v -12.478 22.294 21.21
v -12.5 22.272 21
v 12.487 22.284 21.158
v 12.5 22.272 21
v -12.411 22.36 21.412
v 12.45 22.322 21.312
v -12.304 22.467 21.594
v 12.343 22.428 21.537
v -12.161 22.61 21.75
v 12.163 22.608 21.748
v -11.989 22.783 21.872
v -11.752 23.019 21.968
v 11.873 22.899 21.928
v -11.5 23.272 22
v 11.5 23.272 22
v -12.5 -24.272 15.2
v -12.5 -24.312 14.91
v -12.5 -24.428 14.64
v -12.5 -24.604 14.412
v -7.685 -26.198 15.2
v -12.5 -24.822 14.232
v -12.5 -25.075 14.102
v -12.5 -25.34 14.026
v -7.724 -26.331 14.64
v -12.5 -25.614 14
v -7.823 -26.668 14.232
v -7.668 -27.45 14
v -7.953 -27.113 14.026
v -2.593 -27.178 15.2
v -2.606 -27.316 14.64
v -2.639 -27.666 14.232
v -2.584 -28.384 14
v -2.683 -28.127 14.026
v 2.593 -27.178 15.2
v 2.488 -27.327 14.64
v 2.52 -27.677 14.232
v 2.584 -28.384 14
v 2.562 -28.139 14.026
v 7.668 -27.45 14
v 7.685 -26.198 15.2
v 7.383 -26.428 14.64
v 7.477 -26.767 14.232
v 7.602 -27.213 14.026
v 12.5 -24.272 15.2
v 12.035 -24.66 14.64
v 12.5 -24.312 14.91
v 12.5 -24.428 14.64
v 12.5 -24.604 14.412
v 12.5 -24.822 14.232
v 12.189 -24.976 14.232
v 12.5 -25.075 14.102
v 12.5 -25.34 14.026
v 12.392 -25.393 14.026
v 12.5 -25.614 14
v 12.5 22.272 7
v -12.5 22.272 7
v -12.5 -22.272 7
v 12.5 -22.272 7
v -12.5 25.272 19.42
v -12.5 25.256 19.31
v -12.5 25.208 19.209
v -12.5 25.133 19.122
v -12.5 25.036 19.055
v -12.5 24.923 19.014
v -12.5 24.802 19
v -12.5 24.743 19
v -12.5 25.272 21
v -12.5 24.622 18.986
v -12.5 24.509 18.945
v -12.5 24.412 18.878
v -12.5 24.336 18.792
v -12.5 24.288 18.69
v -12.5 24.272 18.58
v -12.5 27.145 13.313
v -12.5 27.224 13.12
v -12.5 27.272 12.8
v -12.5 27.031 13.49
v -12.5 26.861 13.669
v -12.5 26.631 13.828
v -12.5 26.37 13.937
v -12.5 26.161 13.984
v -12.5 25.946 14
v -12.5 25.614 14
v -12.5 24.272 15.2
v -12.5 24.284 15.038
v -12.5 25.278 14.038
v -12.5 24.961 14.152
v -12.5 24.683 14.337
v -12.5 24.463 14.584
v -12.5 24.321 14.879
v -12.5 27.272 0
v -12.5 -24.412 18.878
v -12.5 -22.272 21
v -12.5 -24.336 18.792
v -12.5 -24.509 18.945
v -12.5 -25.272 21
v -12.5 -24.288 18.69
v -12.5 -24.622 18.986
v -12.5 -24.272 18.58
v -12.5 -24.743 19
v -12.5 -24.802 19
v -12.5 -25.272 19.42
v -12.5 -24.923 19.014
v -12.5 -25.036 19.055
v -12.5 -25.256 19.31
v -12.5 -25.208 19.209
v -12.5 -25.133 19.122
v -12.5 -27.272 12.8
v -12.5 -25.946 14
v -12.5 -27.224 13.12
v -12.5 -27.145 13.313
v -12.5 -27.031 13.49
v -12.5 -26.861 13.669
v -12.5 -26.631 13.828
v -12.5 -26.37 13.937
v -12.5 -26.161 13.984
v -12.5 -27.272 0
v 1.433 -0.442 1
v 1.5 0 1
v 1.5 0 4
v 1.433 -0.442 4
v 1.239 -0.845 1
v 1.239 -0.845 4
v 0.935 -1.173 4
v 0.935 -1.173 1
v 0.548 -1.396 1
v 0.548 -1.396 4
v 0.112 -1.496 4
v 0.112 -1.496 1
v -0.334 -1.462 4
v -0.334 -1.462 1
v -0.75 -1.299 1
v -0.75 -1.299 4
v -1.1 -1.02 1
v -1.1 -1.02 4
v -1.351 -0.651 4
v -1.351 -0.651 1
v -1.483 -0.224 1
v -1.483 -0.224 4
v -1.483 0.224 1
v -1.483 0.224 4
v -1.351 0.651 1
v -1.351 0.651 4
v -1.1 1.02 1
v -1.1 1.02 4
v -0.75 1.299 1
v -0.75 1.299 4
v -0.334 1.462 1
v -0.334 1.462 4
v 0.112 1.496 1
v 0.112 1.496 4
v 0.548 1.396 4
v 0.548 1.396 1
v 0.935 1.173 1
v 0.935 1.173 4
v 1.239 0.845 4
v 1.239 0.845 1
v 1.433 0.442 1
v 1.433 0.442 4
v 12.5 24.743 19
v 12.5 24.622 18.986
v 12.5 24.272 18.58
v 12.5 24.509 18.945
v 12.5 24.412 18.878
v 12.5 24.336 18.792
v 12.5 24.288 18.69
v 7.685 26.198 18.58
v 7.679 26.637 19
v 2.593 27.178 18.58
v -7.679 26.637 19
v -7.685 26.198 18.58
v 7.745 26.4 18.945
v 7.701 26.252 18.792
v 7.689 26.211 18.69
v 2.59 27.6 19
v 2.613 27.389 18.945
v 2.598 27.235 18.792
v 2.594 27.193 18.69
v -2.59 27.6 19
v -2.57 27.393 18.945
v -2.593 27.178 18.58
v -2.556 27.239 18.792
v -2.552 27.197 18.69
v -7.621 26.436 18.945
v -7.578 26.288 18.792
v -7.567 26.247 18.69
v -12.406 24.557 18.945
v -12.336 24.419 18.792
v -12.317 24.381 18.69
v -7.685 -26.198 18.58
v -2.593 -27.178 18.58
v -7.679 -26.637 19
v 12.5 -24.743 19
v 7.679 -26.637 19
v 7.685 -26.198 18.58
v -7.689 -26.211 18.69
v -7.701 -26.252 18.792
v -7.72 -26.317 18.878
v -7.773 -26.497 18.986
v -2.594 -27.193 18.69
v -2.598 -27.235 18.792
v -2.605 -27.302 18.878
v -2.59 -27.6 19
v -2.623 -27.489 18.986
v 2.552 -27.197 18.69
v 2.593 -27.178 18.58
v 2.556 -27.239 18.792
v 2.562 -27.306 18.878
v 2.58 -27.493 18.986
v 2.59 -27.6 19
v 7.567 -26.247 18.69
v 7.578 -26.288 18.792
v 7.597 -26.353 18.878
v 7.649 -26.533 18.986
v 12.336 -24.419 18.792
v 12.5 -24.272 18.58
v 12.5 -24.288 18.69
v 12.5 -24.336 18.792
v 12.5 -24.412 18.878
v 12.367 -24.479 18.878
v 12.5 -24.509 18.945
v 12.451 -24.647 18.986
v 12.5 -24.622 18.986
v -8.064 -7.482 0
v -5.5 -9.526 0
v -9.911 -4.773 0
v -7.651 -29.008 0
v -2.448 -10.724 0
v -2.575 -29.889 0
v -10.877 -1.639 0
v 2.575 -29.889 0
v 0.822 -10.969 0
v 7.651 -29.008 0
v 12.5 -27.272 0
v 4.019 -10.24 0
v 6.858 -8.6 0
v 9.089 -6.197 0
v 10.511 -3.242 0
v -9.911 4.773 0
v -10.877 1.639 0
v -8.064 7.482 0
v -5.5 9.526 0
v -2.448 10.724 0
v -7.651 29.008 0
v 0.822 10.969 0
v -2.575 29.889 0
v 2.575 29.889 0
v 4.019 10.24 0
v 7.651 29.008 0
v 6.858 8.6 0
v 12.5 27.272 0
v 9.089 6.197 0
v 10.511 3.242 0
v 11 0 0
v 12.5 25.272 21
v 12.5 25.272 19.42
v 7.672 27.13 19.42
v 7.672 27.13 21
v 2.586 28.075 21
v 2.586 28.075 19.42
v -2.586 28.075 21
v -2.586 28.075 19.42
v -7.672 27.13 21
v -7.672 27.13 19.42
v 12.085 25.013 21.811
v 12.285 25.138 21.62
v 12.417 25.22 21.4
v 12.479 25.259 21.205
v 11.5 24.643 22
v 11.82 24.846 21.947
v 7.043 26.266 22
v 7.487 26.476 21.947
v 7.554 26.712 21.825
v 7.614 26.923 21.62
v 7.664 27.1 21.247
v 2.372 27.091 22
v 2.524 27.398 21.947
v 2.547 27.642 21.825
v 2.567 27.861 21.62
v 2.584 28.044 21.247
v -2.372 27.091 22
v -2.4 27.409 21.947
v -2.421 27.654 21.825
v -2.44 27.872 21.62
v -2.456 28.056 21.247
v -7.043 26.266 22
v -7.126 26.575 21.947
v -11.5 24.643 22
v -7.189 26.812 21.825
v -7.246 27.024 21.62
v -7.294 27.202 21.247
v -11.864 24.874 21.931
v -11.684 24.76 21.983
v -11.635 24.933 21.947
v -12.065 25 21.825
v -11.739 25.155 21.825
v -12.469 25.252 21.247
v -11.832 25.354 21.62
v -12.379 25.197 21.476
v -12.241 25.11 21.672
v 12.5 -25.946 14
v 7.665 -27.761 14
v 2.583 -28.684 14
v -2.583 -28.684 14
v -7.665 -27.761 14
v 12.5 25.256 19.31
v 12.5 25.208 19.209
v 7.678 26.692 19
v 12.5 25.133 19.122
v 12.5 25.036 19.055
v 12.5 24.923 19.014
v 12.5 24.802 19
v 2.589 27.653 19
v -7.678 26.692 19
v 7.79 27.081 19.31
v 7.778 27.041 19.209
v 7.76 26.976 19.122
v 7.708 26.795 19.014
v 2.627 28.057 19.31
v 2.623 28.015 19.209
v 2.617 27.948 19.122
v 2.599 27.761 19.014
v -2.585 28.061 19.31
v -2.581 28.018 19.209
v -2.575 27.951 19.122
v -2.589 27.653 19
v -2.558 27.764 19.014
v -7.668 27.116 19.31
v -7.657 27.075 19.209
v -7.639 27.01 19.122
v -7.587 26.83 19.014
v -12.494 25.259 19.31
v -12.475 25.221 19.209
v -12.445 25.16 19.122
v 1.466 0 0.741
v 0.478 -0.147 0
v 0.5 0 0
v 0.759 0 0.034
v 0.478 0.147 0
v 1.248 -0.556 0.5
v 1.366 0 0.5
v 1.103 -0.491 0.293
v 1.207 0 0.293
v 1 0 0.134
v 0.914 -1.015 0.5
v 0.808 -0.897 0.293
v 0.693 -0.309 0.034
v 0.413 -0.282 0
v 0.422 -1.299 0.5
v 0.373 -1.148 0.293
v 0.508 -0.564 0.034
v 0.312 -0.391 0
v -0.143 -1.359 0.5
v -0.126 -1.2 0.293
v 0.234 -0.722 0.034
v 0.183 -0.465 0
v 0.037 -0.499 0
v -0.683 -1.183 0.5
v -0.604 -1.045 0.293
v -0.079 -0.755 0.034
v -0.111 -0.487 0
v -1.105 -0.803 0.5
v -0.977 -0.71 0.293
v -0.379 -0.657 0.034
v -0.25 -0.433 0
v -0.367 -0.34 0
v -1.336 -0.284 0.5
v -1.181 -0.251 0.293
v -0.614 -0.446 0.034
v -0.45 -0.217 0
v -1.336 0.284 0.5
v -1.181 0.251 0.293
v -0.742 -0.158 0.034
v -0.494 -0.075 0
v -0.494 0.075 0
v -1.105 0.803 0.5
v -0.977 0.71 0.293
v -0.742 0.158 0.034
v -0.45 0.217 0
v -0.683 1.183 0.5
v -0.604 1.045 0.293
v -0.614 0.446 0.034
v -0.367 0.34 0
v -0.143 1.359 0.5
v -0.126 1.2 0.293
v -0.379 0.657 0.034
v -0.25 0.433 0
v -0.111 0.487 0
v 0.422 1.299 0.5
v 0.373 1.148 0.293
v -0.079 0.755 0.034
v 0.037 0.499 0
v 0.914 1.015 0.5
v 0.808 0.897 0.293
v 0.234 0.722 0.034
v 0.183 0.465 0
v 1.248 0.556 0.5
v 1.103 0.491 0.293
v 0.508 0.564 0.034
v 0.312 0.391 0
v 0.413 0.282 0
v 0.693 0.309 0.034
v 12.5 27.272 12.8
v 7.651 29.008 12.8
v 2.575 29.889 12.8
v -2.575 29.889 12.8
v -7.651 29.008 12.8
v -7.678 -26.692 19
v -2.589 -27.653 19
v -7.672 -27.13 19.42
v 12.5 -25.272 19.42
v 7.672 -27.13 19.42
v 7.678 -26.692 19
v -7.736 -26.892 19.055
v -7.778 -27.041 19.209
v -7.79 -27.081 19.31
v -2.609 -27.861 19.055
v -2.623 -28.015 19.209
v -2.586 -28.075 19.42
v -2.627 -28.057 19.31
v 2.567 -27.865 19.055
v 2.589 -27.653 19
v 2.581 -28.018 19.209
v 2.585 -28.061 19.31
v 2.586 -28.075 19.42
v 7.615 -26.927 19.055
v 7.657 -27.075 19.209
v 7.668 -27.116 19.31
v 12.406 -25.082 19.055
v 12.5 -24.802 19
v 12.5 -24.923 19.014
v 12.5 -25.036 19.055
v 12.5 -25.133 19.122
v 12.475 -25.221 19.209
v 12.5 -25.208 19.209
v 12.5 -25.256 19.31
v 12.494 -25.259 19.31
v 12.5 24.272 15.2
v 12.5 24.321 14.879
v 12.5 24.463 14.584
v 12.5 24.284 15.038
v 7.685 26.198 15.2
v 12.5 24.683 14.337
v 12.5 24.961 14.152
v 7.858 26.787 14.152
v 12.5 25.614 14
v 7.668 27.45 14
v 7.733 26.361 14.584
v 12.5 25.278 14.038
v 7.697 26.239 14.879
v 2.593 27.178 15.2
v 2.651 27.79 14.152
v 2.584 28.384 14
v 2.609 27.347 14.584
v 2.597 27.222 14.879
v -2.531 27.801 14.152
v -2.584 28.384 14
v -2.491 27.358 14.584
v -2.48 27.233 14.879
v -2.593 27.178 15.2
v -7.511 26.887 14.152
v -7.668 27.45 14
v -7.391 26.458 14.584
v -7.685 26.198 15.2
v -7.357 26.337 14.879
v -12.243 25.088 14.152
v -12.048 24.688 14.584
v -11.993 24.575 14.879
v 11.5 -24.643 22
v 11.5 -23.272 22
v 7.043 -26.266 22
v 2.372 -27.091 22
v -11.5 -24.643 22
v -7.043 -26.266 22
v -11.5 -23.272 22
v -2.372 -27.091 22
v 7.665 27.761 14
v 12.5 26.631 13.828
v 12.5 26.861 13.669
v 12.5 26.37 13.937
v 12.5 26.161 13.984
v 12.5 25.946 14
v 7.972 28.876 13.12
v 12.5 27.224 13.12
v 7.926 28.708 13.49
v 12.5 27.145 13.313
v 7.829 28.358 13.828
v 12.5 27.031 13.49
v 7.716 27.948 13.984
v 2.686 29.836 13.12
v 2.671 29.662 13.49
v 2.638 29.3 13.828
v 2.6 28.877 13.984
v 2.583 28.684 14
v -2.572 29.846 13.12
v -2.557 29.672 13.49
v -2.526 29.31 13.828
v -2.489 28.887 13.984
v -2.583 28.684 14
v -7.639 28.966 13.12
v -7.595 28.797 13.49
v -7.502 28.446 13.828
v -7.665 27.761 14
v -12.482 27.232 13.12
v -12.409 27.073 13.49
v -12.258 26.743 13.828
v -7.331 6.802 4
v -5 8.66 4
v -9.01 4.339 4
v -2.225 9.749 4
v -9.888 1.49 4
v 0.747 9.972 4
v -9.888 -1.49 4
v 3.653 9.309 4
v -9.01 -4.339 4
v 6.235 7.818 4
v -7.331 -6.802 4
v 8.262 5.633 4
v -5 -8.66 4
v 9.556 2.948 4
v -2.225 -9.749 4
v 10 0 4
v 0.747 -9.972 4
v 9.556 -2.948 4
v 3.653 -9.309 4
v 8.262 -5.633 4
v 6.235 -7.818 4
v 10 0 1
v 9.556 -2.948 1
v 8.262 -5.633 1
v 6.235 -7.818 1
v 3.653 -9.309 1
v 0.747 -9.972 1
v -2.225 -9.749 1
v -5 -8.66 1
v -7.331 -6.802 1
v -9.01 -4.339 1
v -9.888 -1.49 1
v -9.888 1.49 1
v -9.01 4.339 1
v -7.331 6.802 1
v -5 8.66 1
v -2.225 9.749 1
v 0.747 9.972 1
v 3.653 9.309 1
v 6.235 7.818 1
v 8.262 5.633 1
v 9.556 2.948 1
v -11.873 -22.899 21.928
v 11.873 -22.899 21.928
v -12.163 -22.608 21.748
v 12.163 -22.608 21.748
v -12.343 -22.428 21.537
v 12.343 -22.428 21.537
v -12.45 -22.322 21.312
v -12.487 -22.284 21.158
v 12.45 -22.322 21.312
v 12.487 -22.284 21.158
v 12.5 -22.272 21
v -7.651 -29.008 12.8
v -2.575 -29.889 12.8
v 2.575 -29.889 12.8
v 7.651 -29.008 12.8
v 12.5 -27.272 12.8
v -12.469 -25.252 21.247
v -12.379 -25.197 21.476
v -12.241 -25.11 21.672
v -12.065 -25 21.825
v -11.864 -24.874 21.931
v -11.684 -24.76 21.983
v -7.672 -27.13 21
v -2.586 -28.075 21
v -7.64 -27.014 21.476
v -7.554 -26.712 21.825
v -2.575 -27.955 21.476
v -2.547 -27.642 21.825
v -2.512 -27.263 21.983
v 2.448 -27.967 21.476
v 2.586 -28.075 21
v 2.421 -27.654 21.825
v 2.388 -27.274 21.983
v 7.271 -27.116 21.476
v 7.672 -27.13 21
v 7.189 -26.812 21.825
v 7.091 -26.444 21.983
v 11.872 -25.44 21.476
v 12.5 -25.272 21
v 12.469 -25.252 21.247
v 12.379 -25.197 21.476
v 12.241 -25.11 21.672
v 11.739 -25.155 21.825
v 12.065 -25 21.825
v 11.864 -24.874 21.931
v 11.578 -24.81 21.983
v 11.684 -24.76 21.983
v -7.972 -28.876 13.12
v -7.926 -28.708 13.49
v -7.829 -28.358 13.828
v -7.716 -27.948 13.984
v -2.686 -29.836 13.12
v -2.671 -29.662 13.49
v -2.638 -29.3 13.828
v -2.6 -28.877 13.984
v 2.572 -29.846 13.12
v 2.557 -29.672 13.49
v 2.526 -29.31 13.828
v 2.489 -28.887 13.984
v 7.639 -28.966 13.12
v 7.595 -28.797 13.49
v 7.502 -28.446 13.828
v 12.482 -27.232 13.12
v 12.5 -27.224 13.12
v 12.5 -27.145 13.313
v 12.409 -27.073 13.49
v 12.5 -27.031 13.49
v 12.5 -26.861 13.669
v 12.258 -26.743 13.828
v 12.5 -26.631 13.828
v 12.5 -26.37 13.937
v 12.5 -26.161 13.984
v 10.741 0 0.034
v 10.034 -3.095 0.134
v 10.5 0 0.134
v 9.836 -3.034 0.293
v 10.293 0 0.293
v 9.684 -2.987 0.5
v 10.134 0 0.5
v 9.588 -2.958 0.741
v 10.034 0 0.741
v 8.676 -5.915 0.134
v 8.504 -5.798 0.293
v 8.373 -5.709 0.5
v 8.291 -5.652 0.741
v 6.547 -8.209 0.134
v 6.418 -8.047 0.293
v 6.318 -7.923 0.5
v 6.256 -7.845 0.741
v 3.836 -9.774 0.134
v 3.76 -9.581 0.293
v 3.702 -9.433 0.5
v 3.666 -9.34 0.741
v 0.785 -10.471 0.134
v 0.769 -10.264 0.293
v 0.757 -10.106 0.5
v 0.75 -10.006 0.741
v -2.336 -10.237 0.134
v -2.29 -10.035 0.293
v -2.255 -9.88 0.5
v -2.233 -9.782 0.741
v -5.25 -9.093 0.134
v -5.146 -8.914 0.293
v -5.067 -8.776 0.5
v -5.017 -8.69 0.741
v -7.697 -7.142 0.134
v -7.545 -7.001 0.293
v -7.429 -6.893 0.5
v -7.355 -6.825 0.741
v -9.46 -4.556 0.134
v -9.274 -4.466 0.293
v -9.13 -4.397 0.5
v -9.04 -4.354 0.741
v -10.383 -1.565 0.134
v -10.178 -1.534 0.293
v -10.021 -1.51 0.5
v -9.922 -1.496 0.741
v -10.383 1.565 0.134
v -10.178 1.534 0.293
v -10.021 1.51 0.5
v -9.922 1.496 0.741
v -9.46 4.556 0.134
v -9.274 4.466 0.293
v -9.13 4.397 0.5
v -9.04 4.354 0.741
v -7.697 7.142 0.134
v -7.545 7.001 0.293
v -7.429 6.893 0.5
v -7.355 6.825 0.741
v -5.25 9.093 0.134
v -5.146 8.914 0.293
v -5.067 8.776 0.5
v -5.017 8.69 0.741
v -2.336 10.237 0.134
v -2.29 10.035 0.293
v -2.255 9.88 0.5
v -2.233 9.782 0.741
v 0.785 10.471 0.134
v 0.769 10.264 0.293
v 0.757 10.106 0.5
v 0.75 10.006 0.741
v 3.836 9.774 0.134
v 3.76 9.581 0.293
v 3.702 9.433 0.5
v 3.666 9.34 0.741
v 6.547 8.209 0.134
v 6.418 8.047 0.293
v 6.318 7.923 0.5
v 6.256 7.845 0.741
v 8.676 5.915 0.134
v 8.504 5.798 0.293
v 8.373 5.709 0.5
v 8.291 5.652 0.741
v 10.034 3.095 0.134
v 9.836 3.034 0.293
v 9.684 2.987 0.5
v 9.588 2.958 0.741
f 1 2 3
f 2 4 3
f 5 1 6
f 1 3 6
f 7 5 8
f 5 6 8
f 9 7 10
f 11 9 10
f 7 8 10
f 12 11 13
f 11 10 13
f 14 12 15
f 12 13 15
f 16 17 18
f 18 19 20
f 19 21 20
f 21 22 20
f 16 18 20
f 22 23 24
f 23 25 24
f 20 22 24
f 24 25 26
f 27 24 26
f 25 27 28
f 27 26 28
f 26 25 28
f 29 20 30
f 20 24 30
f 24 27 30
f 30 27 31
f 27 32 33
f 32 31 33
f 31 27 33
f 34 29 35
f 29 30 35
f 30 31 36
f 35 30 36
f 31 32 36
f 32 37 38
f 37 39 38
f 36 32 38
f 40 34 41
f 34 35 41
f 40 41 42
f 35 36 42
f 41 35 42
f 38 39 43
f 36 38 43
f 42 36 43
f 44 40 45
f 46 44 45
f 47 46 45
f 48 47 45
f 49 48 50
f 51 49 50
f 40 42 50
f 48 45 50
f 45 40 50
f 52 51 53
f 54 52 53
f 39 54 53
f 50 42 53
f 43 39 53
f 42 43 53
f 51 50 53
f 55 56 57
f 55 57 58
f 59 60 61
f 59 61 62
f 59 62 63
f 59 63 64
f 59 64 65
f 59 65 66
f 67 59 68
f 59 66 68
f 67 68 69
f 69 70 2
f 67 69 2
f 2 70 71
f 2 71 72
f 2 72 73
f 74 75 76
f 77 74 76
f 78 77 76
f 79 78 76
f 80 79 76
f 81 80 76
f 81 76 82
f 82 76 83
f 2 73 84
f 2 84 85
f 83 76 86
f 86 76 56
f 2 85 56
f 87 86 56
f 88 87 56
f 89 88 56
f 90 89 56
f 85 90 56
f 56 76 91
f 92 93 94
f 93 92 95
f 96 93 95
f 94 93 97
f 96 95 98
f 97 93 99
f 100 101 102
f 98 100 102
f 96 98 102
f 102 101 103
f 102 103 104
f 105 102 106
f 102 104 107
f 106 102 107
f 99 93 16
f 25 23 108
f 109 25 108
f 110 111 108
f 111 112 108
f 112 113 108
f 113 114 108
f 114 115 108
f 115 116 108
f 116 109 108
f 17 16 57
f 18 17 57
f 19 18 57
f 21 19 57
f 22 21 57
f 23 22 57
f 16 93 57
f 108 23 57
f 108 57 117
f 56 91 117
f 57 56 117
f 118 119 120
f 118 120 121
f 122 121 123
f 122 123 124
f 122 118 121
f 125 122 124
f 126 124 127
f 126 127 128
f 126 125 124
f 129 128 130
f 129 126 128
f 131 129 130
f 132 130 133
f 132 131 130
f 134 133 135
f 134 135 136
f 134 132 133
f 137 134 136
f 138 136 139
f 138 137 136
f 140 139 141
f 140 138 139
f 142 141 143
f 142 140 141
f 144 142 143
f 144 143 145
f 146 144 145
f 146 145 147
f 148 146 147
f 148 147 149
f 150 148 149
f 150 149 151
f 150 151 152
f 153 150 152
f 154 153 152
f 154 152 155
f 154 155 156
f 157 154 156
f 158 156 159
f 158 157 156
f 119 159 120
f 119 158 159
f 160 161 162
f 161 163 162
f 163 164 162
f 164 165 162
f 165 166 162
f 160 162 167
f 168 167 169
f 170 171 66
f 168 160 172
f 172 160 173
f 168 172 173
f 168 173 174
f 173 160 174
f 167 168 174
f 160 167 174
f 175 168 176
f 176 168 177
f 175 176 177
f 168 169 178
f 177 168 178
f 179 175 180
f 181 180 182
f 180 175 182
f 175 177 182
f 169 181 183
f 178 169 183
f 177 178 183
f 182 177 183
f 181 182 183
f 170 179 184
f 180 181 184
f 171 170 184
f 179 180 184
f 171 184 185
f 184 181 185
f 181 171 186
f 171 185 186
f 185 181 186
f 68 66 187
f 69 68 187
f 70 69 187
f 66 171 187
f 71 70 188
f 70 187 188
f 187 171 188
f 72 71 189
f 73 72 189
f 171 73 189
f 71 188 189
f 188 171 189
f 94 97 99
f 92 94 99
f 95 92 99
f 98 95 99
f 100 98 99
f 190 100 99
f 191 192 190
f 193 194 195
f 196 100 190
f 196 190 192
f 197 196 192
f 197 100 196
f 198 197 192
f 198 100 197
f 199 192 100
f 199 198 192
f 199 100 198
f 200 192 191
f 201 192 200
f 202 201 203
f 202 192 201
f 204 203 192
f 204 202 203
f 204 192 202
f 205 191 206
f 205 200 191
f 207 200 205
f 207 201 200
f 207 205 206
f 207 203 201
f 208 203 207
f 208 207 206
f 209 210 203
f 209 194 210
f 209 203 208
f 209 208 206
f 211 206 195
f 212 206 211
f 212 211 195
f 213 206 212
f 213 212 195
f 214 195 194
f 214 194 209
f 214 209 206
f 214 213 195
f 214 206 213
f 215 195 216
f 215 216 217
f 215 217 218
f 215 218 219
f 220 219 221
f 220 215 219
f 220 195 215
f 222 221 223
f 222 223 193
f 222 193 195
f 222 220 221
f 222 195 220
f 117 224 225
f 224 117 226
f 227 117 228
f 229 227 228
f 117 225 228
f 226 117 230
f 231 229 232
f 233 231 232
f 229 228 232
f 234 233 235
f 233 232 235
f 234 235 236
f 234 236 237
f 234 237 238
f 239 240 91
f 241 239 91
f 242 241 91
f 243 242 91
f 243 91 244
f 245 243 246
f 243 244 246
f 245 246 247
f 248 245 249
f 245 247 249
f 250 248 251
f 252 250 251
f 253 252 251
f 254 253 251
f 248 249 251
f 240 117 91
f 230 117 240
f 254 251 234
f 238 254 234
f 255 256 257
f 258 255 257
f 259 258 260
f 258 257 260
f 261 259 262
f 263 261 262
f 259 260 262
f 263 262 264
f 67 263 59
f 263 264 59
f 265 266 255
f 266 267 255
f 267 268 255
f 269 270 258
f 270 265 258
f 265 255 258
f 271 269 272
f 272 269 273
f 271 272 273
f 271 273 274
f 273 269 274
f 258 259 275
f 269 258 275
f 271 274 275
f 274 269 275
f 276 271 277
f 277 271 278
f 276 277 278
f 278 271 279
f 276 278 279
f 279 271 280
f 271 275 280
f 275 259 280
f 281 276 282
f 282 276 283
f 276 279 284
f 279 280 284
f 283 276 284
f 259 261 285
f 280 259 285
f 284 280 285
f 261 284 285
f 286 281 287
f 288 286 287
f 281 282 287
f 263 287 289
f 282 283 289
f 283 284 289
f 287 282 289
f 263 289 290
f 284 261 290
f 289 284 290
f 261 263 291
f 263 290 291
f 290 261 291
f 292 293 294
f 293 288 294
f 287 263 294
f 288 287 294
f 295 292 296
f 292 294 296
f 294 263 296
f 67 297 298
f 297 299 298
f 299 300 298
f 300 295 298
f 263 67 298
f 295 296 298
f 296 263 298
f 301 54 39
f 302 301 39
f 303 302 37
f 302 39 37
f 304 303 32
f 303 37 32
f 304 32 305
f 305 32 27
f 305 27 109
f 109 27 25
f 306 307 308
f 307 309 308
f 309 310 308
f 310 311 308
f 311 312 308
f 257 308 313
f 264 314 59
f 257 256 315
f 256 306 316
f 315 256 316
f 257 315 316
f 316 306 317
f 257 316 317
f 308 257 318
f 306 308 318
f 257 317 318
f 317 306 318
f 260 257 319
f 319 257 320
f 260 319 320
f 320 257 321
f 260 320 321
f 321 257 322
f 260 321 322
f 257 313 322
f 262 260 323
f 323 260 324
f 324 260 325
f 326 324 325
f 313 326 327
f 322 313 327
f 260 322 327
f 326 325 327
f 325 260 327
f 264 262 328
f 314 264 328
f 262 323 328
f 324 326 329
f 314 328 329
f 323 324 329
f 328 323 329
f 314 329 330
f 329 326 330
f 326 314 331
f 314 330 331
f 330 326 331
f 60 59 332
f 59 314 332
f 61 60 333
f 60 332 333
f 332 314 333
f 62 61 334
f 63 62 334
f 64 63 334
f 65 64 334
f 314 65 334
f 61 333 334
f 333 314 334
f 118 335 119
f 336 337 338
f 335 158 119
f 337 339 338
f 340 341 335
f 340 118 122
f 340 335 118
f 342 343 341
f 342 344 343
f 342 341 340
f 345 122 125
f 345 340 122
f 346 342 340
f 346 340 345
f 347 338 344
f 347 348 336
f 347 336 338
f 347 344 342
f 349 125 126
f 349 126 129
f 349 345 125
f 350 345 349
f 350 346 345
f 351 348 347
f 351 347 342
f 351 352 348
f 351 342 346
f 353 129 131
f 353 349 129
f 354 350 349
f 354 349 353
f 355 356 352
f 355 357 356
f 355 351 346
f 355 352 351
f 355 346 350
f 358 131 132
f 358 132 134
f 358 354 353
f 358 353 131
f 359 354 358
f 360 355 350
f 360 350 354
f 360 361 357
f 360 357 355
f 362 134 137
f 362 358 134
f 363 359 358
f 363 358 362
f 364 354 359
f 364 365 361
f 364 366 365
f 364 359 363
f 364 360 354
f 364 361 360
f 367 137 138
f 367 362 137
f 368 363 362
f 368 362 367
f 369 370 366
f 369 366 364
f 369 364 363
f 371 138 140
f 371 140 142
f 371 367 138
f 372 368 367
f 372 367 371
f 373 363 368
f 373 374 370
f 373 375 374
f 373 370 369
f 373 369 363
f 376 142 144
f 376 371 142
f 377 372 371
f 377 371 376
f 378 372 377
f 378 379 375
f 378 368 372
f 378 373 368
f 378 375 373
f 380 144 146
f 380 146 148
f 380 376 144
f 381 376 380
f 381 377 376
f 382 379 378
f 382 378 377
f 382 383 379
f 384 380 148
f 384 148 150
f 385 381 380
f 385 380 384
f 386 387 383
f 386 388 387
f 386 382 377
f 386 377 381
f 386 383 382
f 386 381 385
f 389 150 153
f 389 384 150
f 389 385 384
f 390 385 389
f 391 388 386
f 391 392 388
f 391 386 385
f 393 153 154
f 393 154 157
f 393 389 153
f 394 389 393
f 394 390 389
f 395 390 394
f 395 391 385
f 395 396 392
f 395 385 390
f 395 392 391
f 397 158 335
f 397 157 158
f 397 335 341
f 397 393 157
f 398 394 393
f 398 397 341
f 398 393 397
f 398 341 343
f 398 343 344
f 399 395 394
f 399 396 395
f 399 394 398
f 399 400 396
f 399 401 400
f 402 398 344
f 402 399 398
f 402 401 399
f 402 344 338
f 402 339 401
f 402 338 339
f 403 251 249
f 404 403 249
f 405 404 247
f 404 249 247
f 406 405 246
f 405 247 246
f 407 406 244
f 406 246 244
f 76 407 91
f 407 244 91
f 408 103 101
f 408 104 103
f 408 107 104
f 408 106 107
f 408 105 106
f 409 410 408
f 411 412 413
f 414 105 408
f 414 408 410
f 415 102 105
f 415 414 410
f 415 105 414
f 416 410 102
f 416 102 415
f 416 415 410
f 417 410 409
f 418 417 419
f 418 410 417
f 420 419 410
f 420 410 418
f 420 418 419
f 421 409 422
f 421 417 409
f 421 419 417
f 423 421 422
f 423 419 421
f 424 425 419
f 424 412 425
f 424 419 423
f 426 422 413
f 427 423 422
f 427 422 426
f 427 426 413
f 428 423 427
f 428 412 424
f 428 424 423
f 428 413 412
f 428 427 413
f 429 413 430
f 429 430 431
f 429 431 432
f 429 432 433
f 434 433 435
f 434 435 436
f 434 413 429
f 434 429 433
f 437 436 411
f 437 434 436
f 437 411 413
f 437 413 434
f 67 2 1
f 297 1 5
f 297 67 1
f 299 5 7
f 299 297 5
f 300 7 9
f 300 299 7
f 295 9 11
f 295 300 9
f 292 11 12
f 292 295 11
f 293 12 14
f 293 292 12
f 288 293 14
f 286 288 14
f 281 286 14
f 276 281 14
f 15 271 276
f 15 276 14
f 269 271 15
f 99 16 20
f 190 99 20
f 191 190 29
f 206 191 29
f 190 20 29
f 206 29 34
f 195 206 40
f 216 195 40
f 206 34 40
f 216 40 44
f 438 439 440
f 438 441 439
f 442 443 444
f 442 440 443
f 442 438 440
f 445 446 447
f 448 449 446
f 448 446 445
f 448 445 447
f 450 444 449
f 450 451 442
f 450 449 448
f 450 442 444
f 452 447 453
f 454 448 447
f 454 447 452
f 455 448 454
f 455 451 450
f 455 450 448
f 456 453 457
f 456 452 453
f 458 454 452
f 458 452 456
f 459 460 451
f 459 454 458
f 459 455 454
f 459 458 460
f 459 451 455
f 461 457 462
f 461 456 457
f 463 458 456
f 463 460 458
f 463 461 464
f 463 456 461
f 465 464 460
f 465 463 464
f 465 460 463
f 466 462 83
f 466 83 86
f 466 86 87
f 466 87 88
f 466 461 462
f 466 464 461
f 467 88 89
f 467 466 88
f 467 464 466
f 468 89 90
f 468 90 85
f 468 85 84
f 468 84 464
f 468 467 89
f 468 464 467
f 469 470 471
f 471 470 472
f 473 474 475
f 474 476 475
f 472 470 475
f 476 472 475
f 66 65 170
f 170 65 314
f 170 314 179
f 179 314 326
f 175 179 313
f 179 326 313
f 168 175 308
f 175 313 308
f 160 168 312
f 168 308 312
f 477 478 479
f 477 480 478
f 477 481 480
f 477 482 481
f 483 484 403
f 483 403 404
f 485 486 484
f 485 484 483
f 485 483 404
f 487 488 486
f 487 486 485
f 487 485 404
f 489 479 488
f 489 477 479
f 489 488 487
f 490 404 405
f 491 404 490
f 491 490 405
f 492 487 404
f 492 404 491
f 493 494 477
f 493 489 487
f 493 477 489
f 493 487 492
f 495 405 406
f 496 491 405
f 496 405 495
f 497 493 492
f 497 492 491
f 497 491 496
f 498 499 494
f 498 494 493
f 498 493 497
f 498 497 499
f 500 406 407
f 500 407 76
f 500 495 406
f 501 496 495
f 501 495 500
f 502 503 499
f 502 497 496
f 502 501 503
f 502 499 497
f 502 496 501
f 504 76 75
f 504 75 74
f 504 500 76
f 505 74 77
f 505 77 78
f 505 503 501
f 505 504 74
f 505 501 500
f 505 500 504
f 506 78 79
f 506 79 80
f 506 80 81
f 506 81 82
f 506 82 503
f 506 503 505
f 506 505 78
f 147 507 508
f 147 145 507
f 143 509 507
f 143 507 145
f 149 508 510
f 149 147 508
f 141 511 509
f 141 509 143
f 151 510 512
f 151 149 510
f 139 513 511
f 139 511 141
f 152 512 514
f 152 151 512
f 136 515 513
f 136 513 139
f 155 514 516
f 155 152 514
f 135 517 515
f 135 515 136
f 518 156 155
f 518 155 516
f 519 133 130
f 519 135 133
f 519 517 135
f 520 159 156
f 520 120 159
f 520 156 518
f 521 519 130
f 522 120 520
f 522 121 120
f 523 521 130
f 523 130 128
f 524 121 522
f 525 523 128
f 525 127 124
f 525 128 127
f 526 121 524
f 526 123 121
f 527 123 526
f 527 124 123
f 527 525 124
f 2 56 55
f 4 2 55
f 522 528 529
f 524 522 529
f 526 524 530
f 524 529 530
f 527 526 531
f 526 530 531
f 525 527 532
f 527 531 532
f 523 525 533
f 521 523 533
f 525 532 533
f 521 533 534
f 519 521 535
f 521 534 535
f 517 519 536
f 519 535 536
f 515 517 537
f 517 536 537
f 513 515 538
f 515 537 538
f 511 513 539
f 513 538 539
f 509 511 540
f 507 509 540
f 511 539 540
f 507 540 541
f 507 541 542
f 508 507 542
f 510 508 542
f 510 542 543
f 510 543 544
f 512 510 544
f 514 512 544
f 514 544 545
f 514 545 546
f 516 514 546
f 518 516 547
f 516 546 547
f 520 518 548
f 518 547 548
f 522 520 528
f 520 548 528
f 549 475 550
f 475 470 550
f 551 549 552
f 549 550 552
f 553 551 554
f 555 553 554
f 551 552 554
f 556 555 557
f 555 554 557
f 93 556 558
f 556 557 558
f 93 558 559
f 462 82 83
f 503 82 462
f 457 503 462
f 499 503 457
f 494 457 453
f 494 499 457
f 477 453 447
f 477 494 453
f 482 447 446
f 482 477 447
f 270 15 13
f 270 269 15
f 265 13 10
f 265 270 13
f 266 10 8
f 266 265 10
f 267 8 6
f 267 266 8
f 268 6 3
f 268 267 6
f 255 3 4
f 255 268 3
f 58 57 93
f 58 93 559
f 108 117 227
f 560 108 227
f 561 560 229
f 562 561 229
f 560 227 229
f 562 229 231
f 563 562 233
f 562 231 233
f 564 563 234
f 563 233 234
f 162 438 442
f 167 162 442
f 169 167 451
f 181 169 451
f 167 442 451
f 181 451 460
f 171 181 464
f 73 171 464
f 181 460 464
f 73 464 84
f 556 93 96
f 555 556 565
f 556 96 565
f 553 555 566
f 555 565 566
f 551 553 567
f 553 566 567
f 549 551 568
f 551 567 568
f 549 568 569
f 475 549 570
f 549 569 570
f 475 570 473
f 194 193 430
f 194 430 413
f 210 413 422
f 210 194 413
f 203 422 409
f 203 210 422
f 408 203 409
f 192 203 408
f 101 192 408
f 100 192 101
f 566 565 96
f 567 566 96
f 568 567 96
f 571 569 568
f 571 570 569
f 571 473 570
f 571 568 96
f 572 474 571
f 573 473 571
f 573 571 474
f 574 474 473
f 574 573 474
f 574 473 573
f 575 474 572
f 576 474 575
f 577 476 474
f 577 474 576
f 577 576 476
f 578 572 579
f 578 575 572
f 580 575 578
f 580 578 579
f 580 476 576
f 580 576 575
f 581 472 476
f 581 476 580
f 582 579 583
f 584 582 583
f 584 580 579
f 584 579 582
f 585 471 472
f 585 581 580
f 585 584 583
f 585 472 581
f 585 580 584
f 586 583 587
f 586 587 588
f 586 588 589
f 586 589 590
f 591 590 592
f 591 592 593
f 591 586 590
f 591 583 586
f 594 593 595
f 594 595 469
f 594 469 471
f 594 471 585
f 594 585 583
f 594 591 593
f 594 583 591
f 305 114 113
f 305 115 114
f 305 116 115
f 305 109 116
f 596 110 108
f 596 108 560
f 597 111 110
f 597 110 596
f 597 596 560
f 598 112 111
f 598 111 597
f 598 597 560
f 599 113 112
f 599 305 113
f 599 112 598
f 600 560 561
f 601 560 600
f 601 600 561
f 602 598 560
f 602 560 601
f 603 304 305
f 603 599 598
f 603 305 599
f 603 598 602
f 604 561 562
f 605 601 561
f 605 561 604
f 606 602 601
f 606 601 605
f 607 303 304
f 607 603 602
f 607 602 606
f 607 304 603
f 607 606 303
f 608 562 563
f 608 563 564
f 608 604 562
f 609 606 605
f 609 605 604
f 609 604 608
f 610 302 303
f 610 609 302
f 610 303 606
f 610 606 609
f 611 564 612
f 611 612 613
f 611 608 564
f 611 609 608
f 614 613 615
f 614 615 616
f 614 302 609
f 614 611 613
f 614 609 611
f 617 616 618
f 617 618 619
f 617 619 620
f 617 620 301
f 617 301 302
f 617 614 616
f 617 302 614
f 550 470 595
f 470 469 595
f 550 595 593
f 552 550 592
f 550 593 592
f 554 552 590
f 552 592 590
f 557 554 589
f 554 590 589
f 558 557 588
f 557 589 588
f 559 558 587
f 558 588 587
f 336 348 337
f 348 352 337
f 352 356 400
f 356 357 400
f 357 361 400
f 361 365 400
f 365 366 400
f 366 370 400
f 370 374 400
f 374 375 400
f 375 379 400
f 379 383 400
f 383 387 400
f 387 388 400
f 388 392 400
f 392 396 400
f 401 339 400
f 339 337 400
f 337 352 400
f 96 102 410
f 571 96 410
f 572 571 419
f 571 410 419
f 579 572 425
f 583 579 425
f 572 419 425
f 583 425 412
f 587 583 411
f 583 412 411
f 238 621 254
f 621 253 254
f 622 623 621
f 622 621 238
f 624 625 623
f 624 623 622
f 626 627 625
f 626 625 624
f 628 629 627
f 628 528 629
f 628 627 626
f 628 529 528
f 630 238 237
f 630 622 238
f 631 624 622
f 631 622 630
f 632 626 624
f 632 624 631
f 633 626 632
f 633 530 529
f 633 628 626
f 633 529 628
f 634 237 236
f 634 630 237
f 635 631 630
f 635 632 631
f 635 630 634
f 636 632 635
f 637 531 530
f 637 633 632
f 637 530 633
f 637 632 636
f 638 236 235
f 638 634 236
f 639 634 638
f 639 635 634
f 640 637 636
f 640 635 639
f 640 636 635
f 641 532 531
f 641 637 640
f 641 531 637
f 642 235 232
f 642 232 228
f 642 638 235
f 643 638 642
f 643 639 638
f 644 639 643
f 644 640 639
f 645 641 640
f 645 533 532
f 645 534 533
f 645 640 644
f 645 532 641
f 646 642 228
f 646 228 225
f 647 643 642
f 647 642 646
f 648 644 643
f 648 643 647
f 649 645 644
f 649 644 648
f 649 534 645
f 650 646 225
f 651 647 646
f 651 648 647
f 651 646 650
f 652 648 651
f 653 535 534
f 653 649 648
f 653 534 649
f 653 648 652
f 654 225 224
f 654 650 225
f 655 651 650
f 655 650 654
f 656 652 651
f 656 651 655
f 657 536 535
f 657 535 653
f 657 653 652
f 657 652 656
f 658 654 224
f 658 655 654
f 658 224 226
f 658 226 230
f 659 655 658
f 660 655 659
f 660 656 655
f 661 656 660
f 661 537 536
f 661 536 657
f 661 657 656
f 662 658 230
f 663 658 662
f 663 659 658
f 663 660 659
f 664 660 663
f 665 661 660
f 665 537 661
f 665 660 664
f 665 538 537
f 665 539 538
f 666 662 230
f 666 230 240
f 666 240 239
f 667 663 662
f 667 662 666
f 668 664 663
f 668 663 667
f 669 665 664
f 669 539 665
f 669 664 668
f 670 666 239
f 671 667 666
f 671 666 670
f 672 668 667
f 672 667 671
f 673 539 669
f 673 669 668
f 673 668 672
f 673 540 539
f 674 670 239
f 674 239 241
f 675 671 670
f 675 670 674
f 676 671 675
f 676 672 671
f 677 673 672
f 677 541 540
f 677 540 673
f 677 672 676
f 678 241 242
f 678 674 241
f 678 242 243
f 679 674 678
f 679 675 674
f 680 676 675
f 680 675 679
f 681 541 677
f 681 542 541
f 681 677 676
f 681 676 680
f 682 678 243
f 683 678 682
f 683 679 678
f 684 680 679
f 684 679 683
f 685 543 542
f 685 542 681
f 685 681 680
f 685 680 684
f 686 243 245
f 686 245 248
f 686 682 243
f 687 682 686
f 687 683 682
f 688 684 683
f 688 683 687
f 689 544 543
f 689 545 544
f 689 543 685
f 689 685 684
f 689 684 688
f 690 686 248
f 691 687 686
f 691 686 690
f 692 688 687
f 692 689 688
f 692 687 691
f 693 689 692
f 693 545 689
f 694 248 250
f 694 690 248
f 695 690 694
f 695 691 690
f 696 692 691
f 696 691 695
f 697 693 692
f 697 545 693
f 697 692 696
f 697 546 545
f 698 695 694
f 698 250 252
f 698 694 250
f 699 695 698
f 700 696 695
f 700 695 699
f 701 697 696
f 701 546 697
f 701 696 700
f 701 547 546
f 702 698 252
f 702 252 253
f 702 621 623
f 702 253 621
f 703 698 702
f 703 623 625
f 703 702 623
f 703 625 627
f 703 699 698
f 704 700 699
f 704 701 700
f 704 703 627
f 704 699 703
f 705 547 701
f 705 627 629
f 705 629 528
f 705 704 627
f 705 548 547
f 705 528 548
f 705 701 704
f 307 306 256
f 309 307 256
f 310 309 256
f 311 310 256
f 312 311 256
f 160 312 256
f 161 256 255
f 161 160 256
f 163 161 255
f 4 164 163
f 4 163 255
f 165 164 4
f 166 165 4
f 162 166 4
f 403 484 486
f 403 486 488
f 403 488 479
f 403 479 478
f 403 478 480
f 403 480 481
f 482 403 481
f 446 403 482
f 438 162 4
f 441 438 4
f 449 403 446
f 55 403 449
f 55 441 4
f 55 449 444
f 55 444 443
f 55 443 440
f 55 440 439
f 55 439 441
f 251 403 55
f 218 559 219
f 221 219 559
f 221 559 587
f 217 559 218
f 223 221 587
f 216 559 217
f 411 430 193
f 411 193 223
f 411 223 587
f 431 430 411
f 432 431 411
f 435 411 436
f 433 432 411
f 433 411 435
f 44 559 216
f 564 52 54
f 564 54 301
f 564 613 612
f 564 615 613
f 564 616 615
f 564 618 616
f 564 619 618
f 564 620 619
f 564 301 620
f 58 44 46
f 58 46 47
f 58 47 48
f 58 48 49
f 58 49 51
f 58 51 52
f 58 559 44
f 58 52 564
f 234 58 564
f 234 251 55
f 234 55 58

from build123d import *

# Parameters (mm, degrees)
PAD_DEPTH     = 7
PAD001_DEPTH  = 7
PAD002_DEPTH  = 5
PAD003_DEPTH  = 3
SKETCH004_R   = 10
SKETCH004_R_2 = 1.5
POCKET_DEPTH  = 4
FILLET_R      = 1
FILLET001_R   = 1.2
FILLET002_R   = 0.42
FILLET003_R   = 1


with BuildPart() as part:
    # Sketch → Pad (new body)
    with BuildSketch(Plane.XY):
        with BuildLine():
            Line((-12.5, 27.27178), (-12.5, -27.27178))
            ThreePointArc((-12.5, -27.27178), (0, -30), (12.5, -27.27178))
            Line((12.5, 27.27178), (12.5, -27.27178))
            ThreePointArc((12.5, 27.27178), (0, 30), (-12.5, 27.27178))
        make_face()
    extrude(amount=PAD_DEPTH)

    # Sketch001 (on Face6 of Pad) → Pad001 (join)
    with BuildSketch(Plane.XY.offset(7)):
        with BuildLine():
            Line((-12.5, 22.27178), (12.5, 22.27178))
            Line((12.5, 27.27178), (12.5, 22.27178))
            ThreePointArc((12.5, 27.27178), (0, 30), (-12.5, 27.27178))
            Line((-12.5, 22.27178), (-12.5, 27.27178))
        make_face()
        with BuildLine():
            Line((-12.5, -22.27178), (12.5, -22.27178))
            Line((12.5, -22.27178), (12.5, -27.27178))
            ThreePointArc((-12.5, -27.27178), (0, -30), (12.5, -27.27178))
            Line((-12.5, -22.27178), (-12.5, -27.27178))
        make_face()
    extrude(amount=PAD001_DEPTH)

    # Sketch002 (on Face12 of Pad001) → Pad002 (join)
    with BuildSketch(Plane.XY.offset(14)):
        with BuildLine():
            Line((-12.5, 22.27178), (12.5, 22.27178))
            Line((12.5, 24.27178), (12.5, 22.27178))
            ThreePointArc((12.5, 24.27178), (0, 27.301453), (-12.5, 24.27178))
            Line((-12.5, 24.27178), (-12.5, 22.27178))
        make_face()
        with BuildLine():
            Line((-12.5, -22.27178), (12.5, -22.27178))
            Line((12.5, -22.27178), (12.5, -24.27178))
            ThreePointArc((-12.5, -24.27178), (0, -27.301453), (12.5, -24.27178))
            Line((-12.5, -22.27178), (-12.5, -24.27178))
        make_face()
    extrude(amount=PAD002_DEPTH)

    # Sketch003 (on Face23 of Pad002) → Pad003 (join)
    with BuildSketch(Plane.XY.offset(19)):
        with BuildLine():
            Line((-12.5, -22.27178), (12.5, -22.27178))
            Line((12.5, -22.27178), (12.5, -25.27178))
            ThreePointArc((-12.5, -25.27178), (0, -28.194199), (12.5, -25.27178))
            Line((-12.5, -22.27178), (-12.5, -25.27178))
        make_face()
        with BuildLine():
            Line((-12.5, 22.27178), (12.5, 22.27178))
            Line((12.5, 22.27178), (12.5, 25.27178))
            ThreePointArc((12.5, 25.27178), (0, 28.194199), (-12.5, 25.27178))
            Line((-12.5, 22.27178), (-12.5, 25.27178))
        make_face()
    extrude(amount=PAD003_DEPTH)

    # Sketch004 (on Face4 of Pad003) → Pocket (cut)
    with BuildSketch(Plane(origin=(0, 0, 0), x_dir=(1, 0, 0), z_dir=(0, 0, -1))):
        Circle(SKETCH004_R)
        Circle(SKETCH004_R_2, mode=Mode.SUBTRACT)
    extrude(amount=-POCKET_DEPTH, mode=Mode.SUBTRACT)

    # Fillet
    fillet_edges = [part.edges().sort_by_distance(p)[0] for p in [
        (-1.5, 0, 0),
        (-10, 0, 0),
    ]]
    fillet(fillet_edges, radius=FILLET_R)

    # Fillet001
    fillet001_edges = [part.edges().sort_by_distance(p)[0] for p in [
        (0, 27.301453, 14),
        (0, 30, 14),
        (0, -27.301453, 14),
        (0, -30, 14),
    ]]
    fillet(fillet001_edges, radius=FILLET001_R)

    # Fillet002
    fillet002_edges = [part.edges().sort_by_distance(p)[0] for p in [
        (0, -27.301453, 19),
        (0, -28.194199, 19),
        (0, 27.301453, 19),
        (0, 28.194199, 19),
    ]]
    fillet(fillet002_edges, radius=FILLET002_R)

    # Fillet003
    fillet003_edges = [part.edges().sort_by_distance(p)[0] for p in [
        (0, -28.194199, 22),
        (12.5, -23.77178, 22),
        (0, -22.27178, 22),
        (-12.5, -23.77178, 22),
        (-12.5, 23.77178, 22),
        (0, 28.194199, 22),
        (12.5, 23.77178, 22),
        (0, 22.27178, 22),
    ]]
    fillet(fillet003_edges, radius=FILLET003_R)


solid = part.part
